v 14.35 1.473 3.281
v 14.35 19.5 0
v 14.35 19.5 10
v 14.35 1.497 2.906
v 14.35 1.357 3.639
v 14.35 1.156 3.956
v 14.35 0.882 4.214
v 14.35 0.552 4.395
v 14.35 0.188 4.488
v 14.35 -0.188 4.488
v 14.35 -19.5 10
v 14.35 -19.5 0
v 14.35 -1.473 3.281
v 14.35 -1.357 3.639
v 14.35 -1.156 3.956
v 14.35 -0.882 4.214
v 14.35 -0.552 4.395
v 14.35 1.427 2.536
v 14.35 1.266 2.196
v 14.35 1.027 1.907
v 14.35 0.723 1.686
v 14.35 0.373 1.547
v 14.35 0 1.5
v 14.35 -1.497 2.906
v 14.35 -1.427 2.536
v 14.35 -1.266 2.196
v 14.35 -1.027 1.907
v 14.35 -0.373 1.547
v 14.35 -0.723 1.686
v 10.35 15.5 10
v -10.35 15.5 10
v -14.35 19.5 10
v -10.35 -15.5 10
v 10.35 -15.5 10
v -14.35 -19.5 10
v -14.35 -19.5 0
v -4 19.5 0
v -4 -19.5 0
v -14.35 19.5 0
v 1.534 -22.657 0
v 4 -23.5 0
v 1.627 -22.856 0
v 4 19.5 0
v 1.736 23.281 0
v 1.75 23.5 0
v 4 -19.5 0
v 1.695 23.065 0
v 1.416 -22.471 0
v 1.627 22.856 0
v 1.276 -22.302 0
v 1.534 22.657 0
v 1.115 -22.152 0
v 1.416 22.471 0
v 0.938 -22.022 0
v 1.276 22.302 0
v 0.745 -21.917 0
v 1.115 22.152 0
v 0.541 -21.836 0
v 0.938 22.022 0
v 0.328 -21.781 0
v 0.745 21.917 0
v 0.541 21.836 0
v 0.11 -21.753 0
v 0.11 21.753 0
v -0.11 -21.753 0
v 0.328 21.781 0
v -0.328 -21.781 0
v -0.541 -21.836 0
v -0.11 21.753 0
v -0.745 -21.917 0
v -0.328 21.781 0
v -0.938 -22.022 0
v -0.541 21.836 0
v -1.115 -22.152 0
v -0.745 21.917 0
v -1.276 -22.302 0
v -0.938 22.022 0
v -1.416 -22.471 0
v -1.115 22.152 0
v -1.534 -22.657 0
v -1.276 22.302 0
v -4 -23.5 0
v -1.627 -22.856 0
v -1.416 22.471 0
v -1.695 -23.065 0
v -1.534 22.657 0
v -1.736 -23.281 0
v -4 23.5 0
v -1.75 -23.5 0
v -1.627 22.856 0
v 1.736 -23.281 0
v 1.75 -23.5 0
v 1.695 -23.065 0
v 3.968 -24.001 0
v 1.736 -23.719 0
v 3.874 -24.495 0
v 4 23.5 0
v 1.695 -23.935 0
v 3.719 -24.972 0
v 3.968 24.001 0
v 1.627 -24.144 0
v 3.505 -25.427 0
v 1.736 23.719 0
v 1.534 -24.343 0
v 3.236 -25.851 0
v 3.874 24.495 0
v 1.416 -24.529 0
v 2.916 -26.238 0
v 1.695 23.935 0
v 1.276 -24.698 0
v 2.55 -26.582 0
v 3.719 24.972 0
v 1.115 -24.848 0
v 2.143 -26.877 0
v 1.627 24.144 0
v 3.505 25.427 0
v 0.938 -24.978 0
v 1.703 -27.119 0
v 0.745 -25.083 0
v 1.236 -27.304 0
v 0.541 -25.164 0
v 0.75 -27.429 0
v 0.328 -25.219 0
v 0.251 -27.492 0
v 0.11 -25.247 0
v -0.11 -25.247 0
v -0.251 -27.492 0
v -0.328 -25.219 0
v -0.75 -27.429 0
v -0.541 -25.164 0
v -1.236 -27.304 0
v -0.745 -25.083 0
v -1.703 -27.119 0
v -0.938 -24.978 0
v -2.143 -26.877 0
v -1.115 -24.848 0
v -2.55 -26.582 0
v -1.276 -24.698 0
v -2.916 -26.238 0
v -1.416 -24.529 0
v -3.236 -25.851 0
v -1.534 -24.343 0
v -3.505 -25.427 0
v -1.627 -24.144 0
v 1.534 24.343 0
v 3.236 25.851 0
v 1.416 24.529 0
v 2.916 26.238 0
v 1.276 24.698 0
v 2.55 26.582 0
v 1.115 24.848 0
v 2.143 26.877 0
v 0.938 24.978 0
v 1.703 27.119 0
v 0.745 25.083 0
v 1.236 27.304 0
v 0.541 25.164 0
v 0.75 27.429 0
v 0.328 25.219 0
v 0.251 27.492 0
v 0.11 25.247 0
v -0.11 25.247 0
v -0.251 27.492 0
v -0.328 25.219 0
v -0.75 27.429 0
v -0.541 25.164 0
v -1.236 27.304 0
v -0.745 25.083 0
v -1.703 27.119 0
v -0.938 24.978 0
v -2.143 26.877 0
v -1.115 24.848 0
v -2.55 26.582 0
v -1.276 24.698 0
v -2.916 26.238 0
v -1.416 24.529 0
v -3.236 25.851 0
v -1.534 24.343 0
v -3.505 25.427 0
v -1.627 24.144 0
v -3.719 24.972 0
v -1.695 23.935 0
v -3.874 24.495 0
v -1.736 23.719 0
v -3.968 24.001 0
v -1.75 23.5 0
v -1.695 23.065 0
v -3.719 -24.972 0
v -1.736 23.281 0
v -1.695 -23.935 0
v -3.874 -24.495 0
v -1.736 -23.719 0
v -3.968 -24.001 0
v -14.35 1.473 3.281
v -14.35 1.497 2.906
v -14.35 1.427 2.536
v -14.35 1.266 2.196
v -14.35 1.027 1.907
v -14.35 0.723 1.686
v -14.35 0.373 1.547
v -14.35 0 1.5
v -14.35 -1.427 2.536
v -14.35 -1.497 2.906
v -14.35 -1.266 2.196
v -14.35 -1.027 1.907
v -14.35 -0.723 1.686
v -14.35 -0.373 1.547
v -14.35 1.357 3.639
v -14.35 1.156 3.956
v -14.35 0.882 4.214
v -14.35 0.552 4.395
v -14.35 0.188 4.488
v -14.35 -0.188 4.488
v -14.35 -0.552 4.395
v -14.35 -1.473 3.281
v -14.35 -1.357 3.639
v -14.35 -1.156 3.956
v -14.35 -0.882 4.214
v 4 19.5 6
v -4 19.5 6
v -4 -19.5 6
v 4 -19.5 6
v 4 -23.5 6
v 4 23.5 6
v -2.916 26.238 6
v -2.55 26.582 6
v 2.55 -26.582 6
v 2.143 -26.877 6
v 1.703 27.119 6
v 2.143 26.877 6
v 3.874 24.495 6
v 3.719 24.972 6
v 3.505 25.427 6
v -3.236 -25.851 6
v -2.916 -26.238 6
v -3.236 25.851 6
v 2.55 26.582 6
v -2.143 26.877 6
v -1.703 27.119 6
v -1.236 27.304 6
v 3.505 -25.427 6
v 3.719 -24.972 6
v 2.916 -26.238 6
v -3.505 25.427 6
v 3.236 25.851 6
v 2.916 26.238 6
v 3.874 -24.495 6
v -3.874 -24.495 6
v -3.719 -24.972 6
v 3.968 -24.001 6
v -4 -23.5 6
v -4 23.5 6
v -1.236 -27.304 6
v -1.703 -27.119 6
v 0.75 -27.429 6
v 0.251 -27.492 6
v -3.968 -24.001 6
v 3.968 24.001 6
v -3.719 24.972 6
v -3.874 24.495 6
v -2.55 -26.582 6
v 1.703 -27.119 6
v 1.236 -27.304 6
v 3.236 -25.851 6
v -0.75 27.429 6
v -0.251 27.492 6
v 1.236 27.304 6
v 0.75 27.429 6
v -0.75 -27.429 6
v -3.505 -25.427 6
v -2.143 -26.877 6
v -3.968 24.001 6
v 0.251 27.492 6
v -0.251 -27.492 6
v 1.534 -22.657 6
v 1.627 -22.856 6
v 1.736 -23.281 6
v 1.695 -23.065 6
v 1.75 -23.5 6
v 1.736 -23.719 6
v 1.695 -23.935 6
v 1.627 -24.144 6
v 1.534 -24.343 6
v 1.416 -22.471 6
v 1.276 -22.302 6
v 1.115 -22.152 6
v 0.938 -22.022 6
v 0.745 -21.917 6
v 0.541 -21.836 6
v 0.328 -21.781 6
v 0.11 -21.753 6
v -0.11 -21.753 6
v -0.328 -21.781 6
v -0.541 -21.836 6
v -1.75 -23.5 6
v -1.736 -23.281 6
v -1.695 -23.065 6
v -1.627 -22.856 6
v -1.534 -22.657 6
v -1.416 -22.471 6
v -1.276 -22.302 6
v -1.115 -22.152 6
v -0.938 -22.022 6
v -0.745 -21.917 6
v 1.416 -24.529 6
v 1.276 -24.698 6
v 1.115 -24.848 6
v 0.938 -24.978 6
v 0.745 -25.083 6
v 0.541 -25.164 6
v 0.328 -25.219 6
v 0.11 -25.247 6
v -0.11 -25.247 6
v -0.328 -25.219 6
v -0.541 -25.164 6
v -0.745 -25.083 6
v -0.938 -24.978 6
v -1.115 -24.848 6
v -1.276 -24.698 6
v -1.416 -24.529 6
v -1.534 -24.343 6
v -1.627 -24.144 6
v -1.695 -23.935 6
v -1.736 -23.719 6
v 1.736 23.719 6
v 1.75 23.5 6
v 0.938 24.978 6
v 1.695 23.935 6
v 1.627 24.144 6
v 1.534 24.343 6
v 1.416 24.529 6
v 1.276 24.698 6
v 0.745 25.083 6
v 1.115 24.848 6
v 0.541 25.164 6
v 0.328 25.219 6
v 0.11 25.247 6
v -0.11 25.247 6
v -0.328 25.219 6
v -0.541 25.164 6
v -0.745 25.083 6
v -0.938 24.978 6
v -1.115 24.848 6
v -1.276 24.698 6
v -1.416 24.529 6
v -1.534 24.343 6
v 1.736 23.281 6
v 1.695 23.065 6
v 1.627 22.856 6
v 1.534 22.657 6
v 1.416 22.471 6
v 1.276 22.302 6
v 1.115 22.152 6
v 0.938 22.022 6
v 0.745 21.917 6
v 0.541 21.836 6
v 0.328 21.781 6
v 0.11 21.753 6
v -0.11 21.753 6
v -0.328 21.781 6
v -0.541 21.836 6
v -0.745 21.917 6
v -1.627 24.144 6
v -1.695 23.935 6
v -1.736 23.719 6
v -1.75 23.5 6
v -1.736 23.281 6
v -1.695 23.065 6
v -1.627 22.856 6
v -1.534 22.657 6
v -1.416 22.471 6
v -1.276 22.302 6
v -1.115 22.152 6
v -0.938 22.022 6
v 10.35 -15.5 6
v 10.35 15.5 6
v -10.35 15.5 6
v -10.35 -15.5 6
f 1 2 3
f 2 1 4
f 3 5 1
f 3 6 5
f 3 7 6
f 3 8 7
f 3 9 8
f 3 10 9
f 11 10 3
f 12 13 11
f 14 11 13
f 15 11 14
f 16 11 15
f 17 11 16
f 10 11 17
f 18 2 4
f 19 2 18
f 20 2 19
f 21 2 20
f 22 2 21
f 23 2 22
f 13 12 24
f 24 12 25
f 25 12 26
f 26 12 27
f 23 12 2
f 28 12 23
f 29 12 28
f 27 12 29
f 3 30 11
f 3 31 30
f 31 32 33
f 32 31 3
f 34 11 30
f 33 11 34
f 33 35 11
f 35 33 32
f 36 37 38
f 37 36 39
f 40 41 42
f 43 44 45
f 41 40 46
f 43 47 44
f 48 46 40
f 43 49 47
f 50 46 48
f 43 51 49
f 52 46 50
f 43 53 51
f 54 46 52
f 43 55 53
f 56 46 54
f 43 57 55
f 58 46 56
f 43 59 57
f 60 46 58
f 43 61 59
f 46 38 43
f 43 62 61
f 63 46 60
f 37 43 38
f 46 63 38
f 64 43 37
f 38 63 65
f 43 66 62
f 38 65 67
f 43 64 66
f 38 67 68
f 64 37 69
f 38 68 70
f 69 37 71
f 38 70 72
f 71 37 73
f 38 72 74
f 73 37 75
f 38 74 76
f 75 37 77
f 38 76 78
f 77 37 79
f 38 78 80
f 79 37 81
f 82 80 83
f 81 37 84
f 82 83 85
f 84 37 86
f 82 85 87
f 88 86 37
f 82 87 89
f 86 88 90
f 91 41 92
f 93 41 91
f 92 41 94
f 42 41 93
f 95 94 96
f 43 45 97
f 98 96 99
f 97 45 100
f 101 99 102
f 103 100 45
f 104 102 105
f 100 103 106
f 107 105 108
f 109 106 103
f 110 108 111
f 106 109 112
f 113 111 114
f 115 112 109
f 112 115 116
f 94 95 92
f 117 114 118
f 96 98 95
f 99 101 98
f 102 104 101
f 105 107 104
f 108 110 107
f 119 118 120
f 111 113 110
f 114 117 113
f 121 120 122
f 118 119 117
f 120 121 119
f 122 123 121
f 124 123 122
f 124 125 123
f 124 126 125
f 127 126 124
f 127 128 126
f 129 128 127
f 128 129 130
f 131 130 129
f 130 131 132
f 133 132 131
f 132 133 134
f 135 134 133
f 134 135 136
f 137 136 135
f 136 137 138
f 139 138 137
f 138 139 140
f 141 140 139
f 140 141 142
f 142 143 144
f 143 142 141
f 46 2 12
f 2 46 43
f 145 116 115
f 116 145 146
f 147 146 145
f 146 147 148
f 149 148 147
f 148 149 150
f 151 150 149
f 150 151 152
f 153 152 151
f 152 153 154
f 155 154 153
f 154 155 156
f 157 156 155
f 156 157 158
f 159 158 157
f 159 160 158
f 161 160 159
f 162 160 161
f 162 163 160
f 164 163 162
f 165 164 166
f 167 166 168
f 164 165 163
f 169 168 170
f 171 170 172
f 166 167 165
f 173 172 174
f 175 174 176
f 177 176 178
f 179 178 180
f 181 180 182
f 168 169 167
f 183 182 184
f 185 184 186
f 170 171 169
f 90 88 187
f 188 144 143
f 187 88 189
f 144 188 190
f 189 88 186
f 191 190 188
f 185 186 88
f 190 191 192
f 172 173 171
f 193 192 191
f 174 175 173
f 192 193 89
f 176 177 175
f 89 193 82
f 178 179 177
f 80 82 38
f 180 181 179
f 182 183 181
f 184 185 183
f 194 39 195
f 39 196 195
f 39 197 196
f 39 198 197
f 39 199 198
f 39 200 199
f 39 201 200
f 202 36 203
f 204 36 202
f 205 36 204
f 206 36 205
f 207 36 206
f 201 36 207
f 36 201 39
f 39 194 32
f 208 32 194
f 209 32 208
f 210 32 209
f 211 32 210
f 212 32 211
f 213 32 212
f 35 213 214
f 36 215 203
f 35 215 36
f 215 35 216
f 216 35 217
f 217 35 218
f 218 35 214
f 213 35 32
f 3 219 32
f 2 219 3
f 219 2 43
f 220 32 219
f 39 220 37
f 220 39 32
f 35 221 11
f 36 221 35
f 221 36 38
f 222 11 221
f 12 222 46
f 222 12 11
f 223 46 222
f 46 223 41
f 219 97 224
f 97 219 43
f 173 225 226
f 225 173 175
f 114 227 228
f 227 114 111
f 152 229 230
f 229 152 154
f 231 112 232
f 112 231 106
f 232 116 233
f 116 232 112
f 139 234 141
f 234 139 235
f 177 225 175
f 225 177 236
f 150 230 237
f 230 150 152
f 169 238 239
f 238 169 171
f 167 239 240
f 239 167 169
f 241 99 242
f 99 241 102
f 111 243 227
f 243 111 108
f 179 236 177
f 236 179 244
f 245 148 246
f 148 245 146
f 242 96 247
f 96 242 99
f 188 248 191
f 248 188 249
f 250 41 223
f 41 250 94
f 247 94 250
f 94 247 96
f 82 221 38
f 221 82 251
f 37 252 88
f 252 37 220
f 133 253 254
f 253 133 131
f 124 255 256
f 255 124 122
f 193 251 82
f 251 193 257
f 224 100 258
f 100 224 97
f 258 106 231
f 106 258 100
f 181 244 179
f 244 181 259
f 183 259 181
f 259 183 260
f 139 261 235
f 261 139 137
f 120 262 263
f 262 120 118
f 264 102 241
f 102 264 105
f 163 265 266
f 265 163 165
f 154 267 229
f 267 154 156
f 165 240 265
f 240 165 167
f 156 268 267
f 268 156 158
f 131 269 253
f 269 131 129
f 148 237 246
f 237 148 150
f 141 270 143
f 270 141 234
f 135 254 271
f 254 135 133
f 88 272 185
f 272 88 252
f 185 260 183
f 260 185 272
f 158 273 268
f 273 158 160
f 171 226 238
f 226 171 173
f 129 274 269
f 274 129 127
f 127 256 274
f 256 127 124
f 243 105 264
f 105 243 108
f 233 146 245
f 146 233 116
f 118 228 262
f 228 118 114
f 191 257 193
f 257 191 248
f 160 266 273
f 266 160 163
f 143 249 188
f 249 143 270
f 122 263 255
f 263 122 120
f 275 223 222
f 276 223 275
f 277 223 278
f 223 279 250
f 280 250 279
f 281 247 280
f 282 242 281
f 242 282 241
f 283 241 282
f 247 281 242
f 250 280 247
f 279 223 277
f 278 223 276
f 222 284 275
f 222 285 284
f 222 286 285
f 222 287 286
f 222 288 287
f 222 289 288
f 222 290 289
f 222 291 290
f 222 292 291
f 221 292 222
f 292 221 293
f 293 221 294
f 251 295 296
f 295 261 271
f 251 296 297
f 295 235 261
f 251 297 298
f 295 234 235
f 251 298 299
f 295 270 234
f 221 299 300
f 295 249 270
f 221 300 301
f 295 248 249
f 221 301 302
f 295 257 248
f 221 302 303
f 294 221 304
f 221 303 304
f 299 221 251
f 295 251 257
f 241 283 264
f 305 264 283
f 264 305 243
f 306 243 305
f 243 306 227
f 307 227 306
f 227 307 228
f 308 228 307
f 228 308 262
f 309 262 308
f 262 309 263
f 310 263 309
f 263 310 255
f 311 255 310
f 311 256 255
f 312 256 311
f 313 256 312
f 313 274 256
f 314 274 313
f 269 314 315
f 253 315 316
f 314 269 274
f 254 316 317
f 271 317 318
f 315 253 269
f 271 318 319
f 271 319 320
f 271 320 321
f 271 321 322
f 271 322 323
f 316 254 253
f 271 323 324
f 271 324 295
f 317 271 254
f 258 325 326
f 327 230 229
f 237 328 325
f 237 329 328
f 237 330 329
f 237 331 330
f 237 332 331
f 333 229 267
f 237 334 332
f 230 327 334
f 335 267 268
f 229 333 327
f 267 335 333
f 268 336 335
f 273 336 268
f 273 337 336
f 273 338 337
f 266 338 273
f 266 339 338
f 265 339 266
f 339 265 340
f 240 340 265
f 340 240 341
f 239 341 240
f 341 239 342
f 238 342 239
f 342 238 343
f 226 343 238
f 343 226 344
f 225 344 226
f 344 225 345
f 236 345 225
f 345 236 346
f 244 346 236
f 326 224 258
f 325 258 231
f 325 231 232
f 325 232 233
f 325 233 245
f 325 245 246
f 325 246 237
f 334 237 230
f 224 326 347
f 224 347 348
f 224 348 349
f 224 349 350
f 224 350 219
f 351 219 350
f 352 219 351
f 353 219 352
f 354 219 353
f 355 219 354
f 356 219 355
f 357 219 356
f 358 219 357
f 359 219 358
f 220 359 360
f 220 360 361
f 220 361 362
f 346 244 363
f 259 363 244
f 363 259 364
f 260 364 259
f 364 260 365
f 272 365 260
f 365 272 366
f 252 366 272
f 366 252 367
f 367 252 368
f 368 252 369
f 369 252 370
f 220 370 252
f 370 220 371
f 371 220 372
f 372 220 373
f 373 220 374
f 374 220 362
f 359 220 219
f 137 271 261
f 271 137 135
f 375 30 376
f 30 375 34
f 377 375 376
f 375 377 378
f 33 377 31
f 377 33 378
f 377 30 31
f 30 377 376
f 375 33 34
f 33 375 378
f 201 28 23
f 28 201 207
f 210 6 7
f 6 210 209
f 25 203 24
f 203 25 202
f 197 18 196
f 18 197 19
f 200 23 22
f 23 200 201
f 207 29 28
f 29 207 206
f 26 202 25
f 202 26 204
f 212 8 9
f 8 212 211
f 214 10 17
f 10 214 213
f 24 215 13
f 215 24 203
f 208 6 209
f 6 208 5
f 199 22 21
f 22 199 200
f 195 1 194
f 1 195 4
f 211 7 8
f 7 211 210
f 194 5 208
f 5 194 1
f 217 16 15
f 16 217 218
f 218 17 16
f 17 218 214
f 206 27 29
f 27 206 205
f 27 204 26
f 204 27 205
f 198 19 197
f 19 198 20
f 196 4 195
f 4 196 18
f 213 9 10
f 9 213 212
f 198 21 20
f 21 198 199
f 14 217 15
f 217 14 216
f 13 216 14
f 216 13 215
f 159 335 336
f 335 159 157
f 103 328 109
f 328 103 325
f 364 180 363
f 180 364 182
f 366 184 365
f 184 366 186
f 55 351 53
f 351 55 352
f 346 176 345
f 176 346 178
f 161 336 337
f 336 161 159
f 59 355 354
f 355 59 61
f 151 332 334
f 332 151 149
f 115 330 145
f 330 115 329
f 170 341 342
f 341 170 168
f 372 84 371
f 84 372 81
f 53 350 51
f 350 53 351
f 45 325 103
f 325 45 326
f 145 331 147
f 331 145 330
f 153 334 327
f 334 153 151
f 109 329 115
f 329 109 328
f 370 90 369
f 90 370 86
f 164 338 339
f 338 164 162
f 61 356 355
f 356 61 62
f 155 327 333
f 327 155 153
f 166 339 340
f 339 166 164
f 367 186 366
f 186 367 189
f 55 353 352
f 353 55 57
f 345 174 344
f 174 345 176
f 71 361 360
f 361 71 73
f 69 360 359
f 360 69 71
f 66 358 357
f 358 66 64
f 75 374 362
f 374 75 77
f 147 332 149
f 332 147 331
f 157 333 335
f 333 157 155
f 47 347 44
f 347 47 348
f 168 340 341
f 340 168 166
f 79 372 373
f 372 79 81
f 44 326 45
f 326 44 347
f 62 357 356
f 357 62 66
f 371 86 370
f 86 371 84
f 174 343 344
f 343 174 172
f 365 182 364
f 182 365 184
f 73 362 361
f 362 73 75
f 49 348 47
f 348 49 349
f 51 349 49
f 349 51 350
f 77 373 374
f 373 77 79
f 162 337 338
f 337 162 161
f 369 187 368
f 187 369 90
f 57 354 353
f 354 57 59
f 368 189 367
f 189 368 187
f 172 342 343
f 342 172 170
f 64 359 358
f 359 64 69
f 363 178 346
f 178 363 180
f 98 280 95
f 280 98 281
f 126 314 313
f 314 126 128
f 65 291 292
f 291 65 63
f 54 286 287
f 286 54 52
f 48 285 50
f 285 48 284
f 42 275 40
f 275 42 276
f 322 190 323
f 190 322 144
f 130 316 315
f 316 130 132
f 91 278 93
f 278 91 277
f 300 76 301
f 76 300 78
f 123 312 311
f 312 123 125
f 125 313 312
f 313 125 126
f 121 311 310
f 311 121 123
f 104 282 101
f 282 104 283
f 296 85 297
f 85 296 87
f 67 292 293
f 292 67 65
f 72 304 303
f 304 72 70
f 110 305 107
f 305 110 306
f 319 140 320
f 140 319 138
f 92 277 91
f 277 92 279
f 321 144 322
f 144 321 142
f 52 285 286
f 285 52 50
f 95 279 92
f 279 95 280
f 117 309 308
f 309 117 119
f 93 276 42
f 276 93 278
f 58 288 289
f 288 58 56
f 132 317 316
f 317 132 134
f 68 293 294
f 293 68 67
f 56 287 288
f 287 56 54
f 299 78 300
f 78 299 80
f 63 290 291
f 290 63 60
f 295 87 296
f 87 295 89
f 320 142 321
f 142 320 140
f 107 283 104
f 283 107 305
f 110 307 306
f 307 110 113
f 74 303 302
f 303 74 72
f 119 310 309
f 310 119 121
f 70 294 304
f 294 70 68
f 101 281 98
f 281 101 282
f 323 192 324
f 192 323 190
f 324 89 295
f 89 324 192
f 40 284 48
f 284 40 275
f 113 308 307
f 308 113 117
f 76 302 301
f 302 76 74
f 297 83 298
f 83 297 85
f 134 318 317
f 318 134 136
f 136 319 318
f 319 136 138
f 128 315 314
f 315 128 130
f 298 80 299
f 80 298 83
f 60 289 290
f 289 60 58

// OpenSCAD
baseThickness = 6.0;
bezelWidth = 4.0;
bezelHeight = 4.0;

boardWidth = 20.7;
boardLength = 31.0;

cableTieWidth = 3.0;
cableTieCentreOffset = 0.0;

screwRadius = 3.5 / 2;
screwTabRadius = 8 / 2;


echo(str("Screw separation: ", boardLength + 2 * (bezelHeight + screwTabRadius)));


// Board cradle
difference() {
  union() {
    // Main body
    translate([-(boardWidth / 2 + bezelWidth), -(boardLength / 2 + bezelWidth), 0]) {
      cube([boardWidth + bezelWidth * 2, boardLength + bezelWidth * 2, baseThickness + bezelHeight]);
    }
    
    // Discorectangle for tab bodies
    hull() {
      translate([0, boardLength / 2 + bezelHeight + screwTabRadius, 0]) {
        cylinder(baseThickness, screwTabRadius, screwTabRadius, $fn = 50);
      }
      translate([0, -(boardLength / 2 + bezelHeight + screwTabRadius), 0]) {
        cylinder(baseThickness, screwTabRadius, screwTabRadius, $fn = 50);
      }
    }
  }
  
  // Board cutout
  translate([-boardWidth / 2, -boardLength / 2, baseThickness]) {
    cube([boardWidth, boardLength, bezelHeight]);
  }
  
  // Cable tie hole
  translate([0, cableTieCentreOffset, baseThickness / 2]) {
    rotate([0, 90, 0]) {
      cylinder(boardWidth + bezelWidth * 2, cableTieWidth / 2, cableTieWidth / 2, center = true, $fn = 25);
    }
  }
  
  // Tab screw holes for tapping
  translate([0, boardLength / 2 + bezelHeight + screwTabRadius, 0]) {
    cylinder(baseThickness, screwRadius, screwRadius, $fn = 50);
  }
  translate([0, -(boardLength / 2 + bezelHeight + screwTabRadius), 0]) {
    cylinder(baseThickness, screwRadius, screwRadius, $fn = 50);
  }
}
